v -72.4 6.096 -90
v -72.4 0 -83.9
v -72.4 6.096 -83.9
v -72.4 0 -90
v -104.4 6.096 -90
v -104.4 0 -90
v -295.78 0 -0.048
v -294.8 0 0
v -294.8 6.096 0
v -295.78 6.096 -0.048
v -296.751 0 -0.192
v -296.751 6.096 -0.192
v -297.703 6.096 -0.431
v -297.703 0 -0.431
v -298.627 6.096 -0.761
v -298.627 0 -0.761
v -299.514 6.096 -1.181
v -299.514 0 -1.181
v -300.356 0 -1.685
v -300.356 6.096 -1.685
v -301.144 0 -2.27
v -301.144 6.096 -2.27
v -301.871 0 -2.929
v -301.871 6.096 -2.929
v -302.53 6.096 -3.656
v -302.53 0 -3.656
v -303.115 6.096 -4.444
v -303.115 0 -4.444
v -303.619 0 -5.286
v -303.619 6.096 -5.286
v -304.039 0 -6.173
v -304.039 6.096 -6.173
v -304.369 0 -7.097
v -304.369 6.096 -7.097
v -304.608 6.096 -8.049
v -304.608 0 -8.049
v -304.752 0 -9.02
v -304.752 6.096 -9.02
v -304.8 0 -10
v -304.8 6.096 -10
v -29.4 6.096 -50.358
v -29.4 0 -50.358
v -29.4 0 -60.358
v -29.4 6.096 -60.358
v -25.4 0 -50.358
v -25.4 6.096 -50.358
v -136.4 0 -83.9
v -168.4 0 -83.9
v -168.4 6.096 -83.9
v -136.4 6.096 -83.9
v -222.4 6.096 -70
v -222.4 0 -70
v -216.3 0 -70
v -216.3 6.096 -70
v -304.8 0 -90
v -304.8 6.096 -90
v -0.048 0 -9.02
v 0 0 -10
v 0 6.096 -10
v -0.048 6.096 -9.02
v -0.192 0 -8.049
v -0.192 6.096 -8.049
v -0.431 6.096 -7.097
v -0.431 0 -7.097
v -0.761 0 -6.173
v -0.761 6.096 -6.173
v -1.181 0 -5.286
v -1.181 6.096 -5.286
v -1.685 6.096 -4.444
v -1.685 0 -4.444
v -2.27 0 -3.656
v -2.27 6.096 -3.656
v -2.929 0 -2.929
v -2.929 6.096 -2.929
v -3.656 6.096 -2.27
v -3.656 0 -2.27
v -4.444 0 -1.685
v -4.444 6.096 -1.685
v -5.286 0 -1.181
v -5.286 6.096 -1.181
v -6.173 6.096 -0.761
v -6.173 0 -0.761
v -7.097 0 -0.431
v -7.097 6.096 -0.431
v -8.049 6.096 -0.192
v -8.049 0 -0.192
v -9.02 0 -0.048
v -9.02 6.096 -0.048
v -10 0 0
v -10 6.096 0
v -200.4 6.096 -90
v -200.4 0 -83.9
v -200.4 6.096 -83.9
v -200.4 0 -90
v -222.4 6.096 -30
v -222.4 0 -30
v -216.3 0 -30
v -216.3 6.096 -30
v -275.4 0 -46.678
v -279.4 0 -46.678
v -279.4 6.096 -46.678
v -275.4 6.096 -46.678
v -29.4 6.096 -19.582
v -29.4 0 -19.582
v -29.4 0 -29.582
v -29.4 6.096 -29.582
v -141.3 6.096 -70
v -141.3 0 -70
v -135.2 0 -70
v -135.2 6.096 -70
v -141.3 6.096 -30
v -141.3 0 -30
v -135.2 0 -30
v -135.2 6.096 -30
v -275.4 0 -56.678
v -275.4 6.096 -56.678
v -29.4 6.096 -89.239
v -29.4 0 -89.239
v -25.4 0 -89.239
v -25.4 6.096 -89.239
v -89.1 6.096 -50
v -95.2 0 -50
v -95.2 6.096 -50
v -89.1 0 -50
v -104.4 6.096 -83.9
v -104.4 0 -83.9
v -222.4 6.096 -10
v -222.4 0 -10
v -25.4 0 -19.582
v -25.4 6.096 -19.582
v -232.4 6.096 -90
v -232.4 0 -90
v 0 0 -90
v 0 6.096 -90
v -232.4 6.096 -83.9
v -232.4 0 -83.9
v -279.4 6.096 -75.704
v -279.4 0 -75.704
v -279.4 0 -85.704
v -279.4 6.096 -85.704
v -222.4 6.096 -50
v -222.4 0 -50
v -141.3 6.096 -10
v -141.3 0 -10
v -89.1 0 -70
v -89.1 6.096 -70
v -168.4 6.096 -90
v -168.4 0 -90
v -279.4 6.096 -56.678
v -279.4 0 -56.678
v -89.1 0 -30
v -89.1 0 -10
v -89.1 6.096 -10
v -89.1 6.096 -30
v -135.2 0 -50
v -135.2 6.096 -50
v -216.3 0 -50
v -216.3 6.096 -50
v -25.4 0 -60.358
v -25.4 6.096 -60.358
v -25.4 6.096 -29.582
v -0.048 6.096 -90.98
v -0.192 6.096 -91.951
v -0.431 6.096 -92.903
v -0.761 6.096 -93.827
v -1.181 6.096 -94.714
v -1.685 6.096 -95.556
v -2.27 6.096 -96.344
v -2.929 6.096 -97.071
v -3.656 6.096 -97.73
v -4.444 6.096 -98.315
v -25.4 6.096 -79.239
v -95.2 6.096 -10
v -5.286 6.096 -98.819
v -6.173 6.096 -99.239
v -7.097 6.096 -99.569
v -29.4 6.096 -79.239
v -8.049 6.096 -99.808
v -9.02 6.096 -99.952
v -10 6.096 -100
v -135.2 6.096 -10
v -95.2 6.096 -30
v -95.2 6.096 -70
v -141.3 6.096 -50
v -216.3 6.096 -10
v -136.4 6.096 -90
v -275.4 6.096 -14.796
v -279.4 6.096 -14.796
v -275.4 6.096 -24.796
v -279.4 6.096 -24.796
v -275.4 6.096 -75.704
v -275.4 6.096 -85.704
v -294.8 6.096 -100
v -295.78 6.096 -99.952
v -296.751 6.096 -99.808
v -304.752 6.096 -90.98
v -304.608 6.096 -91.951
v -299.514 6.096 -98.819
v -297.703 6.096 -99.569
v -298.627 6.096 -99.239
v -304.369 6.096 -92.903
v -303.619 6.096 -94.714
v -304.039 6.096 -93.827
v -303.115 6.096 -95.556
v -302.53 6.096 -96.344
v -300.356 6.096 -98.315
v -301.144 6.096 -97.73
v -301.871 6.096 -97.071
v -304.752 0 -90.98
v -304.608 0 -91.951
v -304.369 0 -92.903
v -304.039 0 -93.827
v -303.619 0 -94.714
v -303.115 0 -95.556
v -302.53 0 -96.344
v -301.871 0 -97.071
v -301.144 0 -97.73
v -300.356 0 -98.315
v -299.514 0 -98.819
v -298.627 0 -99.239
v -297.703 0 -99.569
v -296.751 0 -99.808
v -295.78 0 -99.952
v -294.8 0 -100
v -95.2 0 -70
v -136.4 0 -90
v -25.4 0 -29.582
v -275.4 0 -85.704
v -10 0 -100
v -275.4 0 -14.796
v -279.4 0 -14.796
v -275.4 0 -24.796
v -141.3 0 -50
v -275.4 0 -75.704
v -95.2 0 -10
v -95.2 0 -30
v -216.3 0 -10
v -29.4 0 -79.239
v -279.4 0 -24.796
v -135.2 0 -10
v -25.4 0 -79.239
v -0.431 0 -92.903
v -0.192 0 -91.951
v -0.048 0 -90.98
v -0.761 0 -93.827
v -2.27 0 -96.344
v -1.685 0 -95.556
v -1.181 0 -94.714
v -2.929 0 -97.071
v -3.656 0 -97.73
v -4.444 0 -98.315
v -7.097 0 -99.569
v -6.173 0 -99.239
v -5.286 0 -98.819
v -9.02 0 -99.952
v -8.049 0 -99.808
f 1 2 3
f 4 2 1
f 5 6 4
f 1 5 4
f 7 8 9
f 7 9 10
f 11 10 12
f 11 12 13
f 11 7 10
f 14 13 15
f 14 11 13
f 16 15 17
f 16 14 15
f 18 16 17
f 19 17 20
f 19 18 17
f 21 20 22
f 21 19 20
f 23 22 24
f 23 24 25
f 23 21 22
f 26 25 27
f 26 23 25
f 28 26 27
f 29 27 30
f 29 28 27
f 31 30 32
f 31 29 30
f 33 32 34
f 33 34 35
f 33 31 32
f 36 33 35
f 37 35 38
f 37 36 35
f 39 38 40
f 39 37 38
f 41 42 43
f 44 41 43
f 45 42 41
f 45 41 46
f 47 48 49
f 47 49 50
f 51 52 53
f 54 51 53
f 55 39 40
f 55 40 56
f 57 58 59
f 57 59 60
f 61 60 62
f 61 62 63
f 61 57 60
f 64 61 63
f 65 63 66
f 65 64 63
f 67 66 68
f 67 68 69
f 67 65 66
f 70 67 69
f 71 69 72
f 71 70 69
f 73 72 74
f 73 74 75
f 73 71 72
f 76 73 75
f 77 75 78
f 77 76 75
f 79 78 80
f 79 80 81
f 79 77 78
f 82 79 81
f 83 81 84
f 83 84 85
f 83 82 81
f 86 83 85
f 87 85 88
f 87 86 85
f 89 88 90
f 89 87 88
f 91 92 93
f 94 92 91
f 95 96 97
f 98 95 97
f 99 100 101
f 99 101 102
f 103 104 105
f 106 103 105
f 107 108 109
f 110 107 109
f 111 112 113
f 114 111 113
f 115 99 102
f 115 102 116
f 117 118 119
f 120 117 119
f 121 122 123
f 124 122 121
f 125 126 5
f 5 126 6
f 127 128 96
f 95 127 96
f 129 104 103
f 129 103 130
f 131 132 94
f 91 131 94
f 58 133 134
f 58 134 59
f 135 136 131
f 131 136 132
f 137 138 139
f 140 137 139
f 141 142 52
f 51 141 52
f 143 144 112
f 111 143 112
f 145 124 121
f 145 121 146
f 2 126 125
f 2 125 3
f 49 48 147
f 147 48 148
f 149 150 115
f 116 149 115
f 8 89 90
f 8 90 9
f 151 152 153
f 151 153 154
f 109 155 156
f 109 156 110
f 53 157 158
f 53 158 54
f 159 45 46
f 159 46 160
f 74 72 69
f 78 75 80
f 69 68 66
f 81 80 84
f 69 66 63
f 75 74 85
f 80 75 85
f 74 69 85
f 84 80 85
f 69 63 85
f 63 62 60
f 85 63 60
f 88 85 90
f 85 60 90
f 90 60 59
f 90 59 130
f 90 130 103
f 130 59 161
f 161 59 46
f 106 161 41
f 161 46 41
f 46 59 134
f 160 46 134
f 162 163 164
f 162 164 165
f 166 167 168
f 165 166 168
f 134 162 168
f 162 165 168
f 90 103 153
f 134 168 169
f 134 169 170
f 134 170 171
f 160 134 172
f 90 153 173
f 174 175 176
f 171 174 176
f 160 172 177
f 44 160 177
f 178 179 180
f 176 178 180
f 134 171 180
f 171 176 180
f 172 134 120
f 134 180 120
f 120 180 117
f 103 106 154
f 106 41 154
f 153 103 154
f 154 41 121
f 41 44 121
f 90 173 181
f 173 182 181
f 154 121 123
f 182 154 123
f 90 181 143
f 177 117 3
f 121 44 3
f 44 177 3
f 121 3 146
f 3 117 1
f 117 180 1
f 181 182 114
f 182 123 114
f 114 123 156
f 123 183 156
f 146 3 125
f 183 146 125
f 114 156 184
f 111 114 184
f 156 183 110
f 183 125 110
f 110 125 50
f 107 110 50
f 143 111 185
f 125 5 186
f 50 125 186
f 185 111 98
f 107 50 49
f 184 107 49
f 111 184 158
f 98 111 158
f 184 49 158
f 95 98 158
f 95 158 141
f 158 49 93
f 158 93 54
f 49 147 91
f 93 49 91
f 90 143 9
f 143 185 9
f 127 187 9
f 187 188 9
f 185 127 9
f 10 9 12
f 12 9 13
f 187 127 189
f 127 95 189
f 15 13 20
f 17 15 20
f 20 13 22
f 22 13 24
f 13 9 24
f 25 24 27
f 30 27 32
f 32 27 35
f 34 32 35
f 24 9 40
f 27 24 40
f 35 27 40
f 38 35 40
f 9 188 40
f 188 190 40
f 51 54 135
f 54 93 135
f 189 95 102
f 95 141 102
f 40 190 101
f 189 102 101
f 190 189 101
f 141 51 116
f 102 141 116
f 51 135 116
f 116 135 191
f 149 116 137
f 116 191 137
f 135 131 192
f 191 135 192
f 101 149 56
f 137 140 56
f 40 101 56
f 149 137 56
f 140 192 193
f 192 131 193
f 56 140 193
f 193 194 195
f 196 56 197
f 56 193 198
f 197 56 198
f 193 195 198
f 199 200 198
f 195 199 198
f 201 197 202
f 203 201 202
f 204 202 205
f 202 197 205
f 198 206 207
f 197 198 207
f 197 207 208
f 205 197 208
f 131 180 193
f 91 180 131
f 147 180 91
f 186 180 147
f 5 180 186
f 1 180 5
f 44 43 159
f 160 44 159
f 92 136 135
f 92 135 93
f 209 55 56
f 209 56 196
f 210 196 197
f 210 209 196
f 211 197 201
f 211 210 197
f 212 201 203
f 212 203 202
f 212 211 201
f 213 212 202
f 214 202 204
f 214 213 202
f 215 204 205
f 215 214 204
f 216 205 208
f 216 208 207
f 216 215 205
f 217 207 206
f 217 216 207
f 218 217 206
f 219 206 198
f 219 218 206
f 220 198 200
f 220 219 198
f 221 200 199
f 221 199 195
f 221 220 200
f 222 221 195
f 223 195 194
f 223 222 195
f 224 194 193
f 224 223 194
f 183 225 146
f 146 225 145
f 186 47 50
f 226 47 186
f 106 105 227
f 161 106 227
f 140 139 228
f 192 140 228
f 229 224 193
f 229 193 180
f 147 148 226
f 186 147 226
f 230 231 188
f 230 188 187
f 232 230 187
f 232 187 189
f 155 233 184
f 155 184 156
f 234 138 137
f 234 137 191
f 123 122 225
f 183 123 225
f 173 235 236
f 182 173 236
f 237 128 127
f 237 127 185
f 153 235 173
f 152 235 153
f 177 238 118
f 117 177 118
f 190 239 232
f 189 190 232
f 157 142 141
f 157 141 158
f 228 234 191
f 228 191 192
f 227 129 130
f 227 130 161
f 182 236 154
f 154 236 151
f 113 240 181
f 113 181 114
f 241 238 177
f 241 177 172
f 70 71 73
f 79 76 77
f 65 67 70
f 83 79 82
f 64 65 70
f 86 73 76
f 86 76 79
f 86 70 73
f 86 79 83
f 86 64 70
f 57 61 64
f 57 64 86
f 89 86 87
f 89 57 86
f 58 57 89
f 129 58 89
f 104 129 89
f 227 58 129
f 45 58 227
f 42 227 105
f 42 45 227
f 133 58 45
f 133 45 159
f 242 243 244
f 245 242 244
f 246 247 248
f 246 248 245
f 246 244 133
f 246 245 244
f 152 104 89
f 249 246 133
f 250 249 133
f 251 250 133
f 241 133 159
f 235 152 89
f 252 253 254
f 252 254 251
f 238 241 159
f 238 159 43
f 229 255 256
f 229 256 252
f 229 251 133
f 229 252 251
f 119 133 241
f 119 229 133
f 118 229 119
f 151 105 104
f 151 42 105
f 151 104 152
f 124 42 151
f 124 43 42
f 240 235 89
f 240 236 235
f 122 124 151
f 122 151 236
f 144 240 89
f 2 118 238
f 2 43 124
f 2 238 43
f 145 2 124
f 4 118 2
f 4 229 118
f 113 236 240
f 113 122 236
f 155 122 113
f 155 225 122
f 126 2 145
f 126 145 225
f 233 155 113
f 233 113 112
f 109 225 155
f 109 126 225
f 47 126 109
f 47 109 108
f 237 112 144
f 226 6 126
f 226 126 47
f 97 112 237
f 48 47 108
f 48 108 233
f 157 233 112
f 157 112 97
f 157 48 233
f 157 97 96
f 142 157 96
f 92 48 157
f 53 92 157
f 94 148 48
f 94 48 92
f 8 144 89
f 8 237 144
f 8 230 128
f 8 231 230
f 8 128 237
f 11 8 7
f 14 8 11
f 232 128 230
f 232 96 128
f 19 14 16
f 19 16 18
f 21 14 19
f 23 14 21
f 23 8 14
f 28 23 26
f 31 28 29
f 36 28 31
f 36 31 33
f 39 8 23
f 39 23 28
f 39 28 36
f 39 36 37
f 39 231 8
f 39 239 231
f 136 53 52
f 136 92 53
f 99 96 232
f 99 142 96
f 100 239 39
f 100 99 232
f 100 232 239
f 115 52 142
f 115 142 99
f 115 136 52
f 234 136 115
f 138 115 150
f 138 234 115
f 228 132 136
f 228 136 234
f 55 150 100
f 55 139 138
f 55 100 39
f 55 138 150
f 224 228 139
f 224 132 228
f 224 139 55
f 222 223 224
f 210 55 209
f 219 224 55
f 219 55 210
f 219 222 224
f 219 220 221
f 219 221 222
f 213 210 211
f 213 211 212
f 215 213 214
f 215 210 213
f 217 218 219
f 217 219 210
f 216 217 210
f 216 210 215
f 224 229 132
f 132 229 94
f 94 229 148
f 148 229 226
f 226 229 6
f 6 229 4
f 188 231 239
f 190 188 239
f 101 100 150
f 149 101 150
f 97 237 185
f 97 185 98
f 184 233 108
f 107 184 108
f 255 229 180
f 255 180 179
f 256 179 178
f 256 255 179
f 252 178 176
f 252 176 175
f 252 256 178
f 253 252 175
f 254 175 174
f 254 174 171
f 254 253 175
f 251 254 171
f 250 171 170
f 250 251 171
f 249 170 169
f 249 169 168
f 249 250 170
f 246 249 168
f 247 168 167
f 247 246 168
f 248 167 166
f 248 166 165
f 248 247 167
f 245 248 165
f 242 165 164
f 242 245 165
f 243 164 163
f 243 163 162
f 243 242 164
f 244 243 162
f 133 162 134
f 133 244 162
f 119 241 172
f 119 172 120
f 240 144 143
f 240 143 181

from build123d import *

# Parameters (mm, degrees)
SKETCH1_W           = 32
SKETCH1_H           = 6.1
SKETCH1_W_2         = 6.1
SKETCH1_H_2         = 20
SKETCH1_W_3         = 4
SKETCH1_H_3         = 10
BOSS_EXTRUDE1_DEPTH = 6.096


with BuildPart() as part:
    # Sketch1 → Boss-Extrude1 (new body)
    with BuildSketch(Plane(origin=(0, 0, 0), x_dir=(1, 0, 0), z_dir=(0, 1, 0))):
        with BuildLine():
            Line((-294.8, 100), (-10, 100))
            ThreePointArc((-10, 100), (-2.928932188, 97.071067812), (0, 90))
            Line((0, 90), (0, 10))
            ThreePointArc((0, 10), (-2.928932188, 2.928932188), (-10, 0))
            Line((-10, 0), (-294.8, 0))
            ThreePointArc((-294.8, 0), (-301.871067812, 2.928932188), (-304.8, 10))
            Line((-304.8, 10), (-304.8, 90))
            ThreePointArc((-304.8, 90), (-301.871067812, 97.071067812), (-294.8, 100))
        make_face()
        with Locations((-216.4, 86.95)):
            Rectangle(SKETCH1_W, SKETCH1_H, mode=Mode.SUBTRACT)
        with Locations((-152.4, 86.95)):
            Rectangle(SKETCH1_W, SKETCH1_H, mode=Mode.SUBTRACT)
        with Locations((-88.4, 86.95)):
            Rectangle(SKETCH1_W, SKETCH1_H, mode=Mode.SUBTRACT)
        with Locations((-219.35, 60)):
            Rectangle(SKETCH1_W_2, SKETCH1_H_2, mode=Mode.SUBTRACT)
        with Locations((-219.35, 20)):
            Rectangle(SKETCH1_W_2, SKETCH1_H_2, mode=Mode.SUBTRACT)
        with Locations((-27.4, 84.239115677)):
            Rectangle(SKETCH1_W_3, SKETCH1_H_3, mode=Mode.SUBTRACT)
        with Locations((-138.25, 60)):
            Rectangle(SKETCH1_W_2, SKETCH1_H_2, mode=Mode.SUBTRACT)
        with Locations((-138.25, 20)):
            Rectangle(SKETCH1_W_2, SKETCH1_H_2, mode=Mode.SUBTRACT)
        with Locations((-277.4, 80.703857292)):
            Rectangle(SKETCH1_W_3, SKETCH1_H_3, mode=Mode.SUBTRACT)
        with Locations((-92.15, 60)):
            Rectangle(SKETCH1_W_2, SKETCH1_H_2, mode=Mode.SUBTRACT)
        with Locations((-92.15, 20)):
            Rectangle(SKETCH1_W_2, SKETCH1_H_2, mode=Mode.SUBTRACT)
        with Locations((-277.4, 19.796375445)):
            Rectangle(SKETCH1_W_3, SKETCH1_H_3, mode=Mode.SUBTRACT)
        with Locations((-277.4, 51.677858863)):
            Rectangle(SKETCH1_W_3, SKETCH1_H_3, mode=Mode.SUBTRACT)
        with Locations((-27.4, 24.581782644)):
            Rectangle(SKETCH1_W_3, SKETCH1_H_3, mode=Mode.SUBTRACT)
        with Locations((-27.4, 55.358303889)):
            Rectangle(SKETCH1_W_3, SKETCH1_H_3, mode=Mode.SUBTRACT)
    extrude(amount=BOSS_EXTRUDE1_DEPTH)


solid = part.part
